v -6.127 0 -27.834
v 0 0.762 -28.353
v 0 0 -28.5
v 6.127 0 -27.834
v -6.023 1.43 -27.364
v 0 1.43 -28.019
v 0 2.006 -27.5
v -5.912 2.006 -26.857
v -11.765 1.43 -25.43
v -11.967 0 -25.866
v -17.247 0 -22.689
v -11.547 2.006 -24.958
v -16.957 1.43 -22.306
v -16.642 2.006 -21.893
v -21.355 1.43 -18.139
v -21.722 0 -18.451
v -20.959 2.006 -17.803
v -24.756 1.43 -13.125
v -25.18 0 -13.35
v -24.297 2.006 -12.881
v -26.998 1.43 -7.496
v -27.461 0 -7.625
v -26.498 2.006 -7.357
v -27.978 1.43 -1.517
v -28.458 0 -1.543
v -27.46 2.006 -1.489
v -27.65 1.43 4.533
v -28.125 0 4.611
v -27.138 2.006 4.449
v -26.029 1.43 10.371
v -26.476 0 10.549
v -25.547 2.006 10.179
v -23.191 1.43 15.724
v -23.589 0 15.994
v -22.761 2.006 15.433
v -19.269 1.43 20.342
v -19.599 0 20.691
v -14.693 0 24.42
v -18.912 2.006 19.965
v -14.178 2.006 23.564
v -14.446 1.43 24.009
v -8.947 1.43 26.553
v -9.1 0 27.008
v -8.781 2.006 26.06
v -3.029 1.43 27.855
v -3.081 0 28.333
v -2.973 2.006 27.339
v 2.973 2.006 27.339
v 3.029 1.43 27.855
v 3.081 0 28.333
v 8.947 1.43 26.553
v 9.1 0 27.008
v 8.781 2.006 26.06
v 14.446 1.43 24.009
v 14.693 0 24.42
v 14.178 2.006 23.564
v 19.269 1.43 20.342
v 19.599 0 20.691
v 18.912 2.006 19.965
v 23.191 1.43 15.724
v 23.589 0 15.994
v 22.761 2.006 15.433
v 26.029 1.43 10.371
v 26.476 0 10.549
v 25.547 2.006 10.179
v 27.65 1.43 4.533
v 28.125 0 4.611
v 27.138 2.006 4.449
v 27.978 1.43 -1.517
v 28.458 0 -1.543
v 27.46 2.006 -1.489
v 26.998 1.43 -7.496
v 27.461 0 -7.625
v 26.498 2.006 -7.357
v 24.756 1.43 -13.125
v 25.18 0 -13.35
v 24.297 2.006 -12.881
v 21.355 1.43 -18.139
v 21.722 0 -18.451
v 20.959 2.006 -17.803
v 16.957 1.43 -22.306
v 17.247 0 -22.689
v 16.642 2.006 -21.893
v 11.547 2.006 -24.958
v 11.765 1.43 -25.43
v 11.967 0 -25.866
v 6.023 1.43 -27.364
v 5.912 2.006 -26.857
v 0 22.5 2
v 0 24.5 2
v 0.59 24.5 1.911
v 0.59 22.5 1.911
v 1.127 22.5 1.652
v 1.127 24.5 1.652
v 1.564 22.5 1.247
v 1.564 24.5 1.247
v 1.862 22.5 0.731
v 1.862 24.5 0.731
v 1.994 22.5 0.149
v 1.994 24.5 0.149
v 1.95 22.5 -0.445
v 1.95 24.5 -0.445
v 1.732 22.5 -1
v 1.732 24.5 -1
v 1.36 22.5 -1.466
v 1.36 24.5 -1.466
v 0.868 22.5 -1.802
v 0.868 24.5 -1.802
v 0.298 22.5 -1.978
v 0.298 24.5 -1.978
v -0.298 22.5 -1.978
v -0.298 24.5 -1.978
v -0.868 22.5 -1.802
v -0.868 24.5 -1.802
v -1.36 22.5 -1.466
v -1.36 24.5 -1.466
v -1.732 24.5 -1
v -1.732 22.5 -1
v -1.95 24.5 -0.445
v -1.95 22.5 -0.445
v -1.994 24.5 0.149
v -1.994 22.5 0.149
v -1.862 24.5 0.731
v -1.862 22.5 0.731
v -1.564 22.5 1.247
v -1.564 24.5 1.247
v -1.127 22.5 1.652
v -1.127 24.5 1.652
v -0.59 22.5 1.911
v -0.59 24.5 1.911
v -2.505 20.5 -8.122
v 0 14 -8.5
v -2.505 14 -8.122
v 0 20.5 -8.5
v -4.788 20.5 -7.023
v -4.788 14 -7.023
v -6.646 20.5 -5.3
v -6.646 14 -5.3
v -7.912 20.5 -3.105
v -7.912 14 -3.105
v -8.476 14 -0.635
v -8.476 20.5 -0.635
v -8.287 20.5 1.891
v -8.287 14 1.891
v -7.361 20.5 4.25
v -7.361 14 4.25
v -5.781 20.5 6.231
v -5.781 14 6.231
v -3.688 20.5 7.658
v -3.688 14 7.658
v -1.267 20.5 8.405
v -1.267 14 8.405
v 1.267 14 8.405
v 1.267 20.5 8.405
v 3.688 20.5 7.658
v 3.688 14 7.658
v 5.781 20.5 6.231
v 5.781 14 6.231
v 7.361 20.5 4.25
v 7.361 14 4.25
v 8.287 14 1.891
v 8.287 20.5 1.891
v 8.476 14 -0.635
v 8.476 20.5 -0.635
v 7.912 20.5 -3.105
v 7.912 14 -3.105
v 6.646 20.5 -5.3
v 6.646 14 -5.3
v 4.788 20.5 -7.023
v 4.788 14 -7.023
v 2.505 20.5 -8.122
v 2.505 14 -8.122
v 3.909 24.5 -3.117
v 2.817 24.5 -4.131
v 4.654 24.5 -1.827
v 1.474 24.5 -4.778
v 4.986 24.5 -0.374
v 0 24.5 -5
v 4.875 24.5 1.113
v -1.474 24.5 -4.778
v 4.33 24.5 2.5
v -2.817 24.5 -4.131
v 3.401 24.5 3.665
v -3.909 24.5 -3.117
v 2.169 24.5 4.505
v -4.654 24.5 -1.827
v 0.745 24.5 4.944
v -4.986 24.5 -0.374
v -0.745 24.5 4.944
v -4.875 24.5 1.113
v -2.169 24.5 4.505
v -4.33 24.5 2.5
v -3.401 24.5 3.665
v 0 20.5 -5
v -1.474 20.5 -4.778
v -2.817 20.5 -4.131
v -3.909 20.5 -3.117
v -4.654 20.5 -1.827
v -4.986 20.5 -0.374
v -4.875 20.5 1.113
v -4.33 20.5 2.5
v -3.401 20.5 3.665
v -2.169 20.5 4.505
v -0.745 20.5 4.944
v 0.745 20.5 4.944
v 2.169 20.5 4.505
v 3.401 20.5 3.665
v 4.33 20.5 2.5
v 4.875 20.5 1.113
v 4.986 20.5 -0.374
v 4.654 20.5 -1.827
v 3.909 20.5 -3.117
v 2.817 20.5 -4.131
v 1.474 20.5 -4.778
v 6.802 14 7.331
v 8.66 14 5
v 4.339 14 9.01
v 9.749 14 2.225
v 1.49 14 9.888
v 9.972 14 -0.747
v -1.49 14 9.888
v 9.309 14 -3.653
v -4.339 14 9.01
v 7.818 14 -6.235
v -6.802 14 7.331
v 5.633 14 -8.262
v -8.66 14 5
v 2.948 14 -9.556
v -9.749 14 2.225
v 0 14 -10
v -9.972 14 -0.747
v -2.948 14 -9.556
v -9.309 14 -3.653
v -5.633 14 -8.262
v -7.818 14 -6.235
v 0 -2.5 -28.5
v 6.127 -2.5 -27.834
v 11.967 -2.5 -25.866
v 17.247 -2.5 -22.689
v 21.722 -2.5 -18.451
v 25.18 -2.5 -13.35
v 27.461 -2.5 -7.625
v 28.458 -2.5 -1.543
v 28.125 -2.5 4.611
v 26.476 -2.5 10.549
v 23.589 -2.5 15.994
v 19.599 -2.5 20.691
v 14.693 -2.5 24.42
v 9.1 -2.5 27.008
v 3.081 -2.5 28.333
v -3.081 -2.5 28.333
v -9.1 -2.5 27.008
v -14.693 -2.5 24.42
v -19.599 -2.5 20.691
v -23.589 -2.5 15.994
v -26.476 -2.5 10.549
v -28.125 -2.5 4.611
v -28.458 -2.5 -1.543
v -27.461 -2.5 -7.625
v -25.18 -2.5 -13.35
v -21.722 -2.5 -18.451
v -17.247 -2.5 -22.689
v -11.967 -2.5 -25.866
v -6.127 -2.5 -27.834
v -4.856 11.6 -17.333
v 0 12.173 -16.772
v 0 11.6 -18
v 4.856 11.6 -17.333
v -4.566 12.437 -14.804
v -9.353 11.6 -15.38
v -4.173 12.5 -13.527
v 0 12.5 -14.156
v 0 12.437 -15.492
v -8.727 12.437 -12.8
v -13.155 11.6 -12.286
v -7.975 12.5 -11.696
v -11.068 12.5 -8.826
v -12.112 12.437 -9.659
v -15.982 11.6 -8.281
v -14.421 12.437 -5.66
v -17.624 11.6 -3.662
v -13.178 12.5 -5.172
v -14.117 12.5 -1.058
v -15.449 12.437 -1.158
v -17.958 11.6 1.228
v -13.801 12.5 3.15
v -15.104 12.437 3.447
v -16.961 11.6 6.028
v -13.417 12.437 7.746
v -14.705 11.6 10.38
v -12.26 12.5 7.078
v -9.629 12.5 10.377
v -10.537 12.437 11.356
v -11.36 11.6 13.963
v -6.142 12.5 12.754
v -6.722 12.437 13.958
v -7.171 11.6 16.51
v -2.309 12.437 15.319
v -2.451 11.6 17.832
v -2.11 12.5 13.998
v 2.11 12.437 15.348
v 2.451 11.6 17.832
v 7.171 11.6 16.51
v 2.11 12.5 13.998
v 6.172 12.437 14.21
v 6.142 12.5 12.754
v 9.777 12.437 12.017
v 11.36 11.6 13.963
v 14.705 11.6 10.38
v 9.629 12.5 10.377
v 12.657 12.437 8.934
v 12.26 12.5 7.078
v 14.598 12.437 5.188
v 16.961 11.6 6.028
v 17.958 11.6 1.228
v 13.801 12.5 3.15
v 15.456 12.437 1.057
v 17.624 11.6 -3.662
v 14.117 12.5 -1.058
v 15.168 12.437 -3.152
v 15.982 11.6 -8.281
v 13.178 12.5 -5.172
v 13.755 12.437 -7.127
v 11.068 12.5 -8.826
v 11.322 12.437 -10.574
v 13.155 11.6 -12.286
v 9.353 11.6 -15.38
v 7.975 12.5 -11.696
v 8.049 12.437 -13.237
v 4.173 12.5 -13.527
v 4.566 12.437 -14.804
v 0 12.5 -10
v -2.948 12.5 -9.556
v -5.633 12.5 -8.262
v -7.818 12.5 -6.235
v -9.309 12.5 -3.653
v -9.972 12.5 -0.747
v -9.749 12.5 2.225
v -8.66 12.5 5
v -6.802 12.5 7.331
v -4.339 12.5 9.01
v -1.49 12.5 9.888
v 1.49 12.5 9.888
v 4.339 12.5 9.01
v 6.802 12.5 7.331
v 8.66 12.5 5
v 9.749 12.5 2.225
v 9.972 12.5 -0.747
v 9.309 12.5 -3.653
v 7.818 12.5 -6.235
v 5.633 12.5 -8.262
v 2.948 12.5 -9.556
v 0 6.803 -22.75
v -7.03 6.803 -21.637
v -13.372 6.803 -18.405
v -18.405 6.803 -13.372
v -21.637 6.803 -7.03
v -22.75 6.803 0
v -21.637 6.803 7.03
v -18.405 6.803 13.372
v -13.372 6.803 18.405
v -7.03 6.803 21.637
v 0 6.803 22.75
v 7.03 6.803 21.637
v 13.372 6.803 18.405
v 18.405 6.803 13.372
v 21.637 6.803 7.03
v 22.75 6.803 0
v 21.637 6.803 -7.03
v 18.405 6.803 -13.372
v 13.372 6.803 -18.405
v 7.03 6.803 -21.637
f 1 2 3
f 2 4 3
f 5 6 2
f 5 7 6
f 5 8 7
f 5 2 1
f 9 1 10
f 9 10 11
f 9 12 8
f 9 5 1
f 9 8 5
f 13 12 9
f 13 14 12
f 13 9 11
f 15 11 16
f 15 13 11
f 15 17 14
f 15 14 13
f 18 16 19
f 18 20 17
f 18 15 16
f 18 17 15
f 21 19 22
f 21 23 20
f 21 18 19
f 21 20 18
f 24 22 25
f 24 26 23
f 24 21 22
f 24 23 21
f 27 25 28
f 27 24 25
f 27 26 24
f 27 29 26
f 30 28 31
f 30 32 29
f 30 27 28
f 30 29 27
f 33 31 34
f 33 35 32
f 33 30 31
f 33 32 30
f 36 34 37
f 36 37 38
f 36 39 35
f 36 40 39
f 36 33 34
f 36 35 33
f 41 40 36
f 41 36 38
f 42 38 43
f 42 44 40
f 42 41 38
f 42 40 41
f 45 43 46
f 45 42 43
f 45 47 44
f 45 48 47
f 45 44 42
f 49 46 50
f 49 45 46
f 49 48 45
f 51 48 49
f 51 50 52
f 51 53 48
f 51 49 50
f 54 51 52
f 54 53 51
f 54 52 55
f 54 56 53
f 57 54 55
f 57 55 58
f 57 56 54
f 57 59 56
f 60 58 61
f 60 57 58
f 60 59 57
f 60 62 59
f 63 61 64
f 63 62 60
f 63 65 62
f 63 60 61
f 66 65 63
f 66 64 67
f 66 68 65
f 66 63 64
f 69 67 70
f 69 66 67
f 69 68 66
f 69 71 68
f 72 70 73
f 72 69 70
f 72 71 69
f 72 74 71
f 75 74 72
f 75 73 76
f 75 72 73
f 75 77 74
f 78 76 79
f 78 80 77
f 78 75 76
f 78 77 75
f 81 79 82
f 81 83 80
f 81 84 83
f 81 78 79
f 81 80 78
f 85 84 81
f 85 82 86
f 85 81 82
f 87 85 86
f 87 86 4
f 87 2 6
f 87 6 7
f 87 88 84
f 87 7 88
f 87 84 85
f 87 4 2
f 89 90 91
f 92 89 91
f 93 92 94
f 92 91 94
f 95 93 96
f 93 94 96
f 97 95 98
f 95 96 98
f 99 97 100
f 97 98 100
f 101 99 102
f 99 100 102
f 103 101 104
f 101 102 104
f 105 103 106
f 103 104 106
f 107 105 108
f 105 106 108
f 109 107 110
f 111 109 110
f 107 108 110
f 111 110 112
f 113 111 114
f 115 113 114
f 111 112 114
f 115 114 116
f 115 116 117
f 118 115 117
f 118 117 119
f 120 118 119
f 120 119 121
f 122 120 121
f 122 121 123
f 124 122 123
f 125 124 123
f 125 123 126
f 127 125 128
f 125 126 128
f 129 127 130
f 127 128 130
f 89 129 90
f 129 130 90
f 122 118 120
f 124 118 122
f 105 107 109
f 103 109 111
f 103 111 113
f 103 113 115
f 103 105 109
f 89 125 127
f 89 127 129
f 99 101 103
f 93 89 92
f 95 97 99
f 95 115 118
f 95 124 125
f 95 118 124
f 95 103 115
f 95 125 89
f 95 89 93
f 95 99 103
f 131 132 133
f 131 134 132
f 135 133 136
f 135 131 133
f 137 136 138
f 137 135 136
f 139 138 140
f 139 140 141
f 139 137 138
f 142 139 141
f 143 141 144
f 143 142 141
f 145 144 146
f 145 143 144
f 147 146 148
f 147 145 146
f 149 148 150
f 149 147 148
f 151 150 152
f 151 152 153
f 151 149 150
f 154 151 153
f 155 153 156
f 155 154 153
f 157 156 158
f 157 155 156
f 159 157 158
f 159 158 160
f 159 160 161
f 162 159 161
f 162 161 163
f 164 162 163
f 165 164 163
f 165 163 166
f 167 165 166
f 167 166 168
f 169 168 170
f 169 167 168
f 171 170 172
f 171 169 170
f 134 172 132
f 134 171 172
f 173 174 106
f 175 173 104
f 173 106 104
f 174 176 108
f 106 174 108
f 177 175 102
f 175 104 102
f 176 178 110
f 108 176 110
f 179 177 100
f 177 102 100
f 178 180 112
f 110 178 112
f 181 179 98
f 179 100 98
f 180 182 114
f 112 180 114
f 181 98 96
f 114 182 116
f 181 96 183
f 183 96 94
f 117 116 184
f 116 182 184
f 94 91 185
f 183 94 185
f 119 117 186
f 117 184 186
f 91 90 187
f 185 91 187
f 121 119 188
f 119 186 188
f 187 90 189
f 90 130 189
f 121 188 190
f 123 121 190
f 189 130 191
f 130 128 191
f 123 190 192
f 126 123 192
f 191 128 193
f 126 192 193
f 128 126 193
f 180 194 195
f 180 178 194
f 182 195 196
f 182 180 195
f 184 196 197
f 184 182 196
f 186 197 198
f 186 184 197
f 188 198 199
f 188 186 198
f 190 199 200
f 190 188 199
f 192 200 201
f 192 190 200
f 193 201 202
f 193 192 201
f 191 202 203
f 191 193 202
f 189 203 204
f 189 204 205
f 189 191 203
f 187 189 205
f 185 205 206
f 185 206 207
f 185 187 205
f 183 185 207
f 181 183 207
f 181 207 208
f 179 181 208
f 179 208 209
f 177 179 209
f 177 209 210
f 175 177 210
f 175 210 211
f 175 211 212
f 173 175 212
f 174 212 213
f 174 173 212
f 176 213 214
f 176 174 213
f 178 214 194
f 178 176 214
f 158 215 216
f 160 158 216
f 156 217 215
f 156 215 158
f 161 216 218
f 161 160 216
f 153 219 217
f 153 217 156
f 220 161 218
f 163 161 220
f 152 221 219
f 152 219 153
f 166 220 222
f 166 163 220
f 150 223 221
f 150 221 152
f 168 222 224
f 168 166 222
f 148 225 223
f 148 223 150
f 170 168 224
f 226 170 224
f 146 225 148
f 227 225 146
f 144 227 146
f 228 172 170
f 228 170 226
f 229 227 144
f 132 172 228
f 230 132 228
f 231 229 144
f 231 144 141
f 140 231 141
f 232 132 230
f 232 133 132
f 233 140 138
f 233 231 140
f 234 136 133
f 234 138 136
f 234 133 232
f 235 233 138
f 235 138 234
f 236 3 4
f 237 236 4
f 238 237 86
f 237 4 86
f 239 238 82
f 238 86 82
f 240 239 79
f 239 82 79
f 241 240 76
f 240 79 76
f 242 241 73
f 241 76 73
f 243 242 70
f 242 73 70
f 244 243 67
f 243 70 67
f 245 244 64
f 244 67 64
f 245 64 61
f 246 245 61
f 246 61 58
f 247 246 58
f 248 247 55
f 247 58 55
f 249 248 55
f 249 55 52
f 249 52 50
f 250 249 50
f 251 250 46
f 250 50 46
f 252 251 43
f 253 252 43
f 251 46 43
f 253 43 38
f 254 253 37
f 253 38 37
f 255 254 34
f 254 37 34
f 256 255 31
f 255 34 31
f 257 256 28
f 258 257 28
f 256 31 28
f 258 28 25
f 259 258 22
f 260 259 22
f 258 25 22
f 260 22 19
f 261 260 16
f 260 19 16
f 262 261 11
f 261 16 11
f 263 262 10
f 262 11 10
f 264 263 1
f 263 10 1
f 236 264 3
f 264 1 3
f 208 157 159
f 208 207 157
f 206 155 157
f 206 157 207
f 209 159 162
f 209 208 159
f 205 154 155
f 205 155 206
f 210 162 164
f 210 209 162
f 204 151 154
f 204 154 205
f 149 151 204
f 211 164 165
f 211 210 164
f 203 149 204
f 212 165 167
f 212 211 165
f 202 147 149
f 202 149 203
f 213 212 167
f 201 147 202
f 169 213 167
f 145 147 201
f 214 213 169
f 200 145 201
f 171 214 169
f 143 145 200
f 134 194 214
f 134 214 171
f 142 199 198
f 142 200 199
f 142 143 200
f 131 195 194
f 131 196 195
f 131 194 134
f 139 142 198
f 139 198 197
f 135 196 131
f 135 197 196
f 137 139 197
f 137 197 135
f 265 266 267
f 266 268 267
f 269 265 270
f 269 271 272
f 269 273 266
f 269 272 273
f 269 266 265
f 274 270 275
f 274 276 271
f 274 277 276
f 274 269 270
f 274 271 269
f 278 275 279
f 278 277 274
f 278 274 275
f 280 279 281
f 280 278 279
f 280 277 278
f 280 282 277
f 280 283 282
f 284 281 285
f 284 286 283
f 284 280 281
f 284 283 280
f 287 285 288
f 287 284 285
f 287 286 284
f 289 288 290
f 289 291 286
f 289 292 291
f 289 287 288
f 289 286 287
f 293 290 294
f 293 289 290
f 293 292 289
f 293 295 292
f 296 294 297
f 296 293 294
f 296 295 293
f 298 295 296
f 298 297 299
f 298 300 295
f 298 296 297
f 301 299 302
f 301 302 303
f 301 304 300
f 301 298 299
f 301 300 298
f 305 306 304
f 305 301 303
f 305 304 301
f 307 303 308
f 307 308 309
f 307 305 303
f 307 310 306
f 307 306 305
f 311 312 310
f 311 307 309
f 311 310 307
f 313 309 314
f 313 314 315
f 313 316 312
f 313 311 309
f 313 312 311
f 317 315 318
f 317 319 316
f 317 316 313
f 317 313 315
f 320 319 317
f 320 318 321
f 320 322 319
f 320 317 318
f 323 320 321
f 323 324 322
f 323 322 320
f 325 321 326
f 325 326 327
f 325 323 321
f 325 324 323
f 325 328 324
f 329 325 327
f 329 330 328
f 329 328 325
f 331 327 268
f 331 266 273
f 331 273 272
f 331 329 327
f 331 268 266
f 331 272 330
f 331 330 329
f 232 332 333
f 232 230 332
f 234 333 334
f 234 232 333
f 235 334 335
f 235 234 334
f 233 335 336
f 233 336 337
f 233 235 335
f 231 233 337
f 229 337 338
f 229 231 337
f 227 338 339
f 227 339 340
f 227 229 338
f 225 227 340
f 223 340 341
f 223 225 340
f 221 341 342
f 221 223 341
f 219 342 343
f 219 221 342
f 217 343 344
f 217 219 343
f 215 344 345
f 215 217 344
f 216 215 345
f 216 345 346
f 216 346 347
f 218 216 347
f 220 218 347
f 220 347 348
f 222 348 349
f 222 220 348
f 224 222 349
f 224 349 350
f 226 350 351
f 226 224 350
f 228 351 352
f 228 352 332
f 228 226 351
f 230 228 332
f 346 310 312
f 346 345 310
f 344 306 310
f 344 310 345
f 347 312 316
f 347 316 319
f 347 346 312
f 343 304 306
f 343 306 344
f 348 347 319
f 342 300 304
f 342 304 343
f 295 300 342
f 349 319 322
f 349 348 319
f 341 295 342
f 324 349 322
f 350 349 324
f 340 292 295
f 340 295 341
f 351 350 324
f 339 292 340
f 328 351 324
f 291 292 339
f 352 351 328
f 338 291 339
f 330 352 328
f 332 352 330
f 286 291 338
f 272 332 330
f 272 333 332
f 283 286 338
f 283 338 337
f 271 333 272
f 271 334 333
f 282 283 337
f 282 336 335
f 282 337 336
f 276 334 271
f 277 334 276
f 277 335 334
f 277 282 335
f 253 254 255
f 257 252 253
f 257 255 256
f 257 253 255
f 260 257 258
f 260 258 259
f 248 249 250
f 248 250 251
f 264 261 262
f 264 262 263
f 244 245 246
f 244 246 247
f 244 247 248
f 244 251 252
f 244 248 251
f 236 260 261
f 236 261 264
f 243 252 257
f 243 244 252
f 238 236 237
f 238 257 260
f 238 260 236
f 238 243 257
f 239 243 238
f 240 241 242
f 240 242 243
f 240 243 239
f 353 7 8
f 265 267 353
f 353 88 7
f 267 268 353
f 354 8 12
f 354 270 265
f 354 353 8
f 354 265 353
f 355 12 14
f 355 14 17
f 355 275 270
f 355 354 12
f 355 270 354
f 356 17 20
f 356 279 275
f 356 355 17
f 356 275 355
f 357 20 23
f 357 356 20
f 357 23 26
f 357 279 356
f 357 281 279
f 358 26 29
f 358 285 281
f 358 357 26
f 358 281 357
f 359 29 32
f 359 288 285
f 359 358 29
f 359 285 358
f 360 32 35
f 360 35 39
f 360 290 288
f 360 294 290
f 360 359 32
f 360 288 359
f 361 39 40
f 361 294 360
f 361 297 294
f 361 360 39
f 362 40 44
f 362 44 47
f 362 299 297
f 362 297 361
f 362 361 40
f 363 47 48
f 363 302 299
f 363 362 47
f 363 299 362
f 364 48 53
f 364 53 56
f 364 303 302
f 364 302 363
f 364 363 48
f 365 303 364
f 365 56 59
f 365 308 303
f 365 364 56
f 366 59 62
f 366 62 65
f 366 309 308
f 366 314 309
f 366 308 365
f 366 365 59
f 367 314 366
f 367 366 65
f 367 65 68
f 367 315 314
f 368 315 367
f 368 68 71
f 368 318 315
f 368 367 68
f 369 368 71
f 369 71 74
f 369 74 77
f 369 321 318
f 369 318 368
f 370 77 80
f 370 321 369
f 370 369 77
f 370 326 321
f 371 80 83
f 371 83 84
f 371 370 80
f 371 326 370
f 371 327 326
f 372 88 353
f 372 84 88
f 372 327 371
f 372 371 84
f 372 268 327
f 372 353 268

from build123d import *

# Parameters (mm, degrees)
SKETCH_1_W          = 5
SKETCH_1_H          = 4
SKETCH_2_R          = 28.5
EXTRUDE_1_DEPTH     = 2.5
SKETCH_3_R          = 2
CUT_EXTRUDE_1_DEPTH = 2


with BuildPart() as part:
    # 草图1 → 旋转1 (revolve)
    with BuildSketch(Plane.XY, mode=Mode.PRIVATE) as revolve_1_sk:
        with Locations((2.5, 22.5)):
            Rectangle(SKETCH_1_W, SKETCH_1_H)
        Polygon((0, 20.5), (0, 14), (8.5, 14), (8.5, 20.5), (5, 20.5), align=None)
        Polygon((0, 14), (0, 12.5), (10, 12.5), (10, 14), (8.5, 14), align=None)
        with BuildLine():
            Line((0, 12.5), (0, 11.6))
            Line((0, 11.6), (18, 11.6))
            add(Edge.make_bspline(
                [(18, 11.6), (16.79764846, 12.364408857), (15.52083483, 12.5), (14.156281908, 12.5)],
                knots=[0, 0, 0, 0, 1, 1, 1, 1], degree=3))
            Line((14.156281908, 12.5), (10, 12.5))
            Line((10, 12.5), (0, 12.5))
        make_face()
        Polygon((0, 11.6), (0, 2.006476073), (27.5, 2.006476073), (18, 11.6), align=None)
        with BuildLine():
            Line((0, 2.006476073), (0, 0))
            Line((0, 0), (28.5, 0))
            add(Edge.make_bspline(
                [(28.5, 0), (28.41881975, 1.211999363), (27.5, 2.006476073)],
                knots=[0, 0, 0, 1, 1, 1], degree=2))
            Line((27.5, 2.006476073), (0, 2.006476073))
        make_face()
    revolve(revolve_1_sk.sketch.rotate(Axis((0, 0, 0), (0, 1, 0)), 90), axis=Axis((0, 0, 0), (0, 1, 0)))

    # 草图2 → 凸台-拉伸1 (add)
    with BuildSketch(Plane.XZ):
        with Locations(Location((0, 0, 0), (0, 0, 270))):
            Circle(SKETCH_2_R)
    extrude(amount=EXTRUDE_1_DEPTH)

    # 草图3 → 切除-拉伸1 (cut)
    with BuildSketch(Plane(origin=(0, 24.5, 0), x_dir=(1, 0, 0), z_dir=(0, 1, 0))):
        with Locations(Location((0, 0, 0), (0, 0, 270))):
            Circle(SKETCH_3_R)
    extrude(amount=-CUT_EXTRUDE_1_DEPTH, mode=Mode.SUBTRACT)


solid = part.part
